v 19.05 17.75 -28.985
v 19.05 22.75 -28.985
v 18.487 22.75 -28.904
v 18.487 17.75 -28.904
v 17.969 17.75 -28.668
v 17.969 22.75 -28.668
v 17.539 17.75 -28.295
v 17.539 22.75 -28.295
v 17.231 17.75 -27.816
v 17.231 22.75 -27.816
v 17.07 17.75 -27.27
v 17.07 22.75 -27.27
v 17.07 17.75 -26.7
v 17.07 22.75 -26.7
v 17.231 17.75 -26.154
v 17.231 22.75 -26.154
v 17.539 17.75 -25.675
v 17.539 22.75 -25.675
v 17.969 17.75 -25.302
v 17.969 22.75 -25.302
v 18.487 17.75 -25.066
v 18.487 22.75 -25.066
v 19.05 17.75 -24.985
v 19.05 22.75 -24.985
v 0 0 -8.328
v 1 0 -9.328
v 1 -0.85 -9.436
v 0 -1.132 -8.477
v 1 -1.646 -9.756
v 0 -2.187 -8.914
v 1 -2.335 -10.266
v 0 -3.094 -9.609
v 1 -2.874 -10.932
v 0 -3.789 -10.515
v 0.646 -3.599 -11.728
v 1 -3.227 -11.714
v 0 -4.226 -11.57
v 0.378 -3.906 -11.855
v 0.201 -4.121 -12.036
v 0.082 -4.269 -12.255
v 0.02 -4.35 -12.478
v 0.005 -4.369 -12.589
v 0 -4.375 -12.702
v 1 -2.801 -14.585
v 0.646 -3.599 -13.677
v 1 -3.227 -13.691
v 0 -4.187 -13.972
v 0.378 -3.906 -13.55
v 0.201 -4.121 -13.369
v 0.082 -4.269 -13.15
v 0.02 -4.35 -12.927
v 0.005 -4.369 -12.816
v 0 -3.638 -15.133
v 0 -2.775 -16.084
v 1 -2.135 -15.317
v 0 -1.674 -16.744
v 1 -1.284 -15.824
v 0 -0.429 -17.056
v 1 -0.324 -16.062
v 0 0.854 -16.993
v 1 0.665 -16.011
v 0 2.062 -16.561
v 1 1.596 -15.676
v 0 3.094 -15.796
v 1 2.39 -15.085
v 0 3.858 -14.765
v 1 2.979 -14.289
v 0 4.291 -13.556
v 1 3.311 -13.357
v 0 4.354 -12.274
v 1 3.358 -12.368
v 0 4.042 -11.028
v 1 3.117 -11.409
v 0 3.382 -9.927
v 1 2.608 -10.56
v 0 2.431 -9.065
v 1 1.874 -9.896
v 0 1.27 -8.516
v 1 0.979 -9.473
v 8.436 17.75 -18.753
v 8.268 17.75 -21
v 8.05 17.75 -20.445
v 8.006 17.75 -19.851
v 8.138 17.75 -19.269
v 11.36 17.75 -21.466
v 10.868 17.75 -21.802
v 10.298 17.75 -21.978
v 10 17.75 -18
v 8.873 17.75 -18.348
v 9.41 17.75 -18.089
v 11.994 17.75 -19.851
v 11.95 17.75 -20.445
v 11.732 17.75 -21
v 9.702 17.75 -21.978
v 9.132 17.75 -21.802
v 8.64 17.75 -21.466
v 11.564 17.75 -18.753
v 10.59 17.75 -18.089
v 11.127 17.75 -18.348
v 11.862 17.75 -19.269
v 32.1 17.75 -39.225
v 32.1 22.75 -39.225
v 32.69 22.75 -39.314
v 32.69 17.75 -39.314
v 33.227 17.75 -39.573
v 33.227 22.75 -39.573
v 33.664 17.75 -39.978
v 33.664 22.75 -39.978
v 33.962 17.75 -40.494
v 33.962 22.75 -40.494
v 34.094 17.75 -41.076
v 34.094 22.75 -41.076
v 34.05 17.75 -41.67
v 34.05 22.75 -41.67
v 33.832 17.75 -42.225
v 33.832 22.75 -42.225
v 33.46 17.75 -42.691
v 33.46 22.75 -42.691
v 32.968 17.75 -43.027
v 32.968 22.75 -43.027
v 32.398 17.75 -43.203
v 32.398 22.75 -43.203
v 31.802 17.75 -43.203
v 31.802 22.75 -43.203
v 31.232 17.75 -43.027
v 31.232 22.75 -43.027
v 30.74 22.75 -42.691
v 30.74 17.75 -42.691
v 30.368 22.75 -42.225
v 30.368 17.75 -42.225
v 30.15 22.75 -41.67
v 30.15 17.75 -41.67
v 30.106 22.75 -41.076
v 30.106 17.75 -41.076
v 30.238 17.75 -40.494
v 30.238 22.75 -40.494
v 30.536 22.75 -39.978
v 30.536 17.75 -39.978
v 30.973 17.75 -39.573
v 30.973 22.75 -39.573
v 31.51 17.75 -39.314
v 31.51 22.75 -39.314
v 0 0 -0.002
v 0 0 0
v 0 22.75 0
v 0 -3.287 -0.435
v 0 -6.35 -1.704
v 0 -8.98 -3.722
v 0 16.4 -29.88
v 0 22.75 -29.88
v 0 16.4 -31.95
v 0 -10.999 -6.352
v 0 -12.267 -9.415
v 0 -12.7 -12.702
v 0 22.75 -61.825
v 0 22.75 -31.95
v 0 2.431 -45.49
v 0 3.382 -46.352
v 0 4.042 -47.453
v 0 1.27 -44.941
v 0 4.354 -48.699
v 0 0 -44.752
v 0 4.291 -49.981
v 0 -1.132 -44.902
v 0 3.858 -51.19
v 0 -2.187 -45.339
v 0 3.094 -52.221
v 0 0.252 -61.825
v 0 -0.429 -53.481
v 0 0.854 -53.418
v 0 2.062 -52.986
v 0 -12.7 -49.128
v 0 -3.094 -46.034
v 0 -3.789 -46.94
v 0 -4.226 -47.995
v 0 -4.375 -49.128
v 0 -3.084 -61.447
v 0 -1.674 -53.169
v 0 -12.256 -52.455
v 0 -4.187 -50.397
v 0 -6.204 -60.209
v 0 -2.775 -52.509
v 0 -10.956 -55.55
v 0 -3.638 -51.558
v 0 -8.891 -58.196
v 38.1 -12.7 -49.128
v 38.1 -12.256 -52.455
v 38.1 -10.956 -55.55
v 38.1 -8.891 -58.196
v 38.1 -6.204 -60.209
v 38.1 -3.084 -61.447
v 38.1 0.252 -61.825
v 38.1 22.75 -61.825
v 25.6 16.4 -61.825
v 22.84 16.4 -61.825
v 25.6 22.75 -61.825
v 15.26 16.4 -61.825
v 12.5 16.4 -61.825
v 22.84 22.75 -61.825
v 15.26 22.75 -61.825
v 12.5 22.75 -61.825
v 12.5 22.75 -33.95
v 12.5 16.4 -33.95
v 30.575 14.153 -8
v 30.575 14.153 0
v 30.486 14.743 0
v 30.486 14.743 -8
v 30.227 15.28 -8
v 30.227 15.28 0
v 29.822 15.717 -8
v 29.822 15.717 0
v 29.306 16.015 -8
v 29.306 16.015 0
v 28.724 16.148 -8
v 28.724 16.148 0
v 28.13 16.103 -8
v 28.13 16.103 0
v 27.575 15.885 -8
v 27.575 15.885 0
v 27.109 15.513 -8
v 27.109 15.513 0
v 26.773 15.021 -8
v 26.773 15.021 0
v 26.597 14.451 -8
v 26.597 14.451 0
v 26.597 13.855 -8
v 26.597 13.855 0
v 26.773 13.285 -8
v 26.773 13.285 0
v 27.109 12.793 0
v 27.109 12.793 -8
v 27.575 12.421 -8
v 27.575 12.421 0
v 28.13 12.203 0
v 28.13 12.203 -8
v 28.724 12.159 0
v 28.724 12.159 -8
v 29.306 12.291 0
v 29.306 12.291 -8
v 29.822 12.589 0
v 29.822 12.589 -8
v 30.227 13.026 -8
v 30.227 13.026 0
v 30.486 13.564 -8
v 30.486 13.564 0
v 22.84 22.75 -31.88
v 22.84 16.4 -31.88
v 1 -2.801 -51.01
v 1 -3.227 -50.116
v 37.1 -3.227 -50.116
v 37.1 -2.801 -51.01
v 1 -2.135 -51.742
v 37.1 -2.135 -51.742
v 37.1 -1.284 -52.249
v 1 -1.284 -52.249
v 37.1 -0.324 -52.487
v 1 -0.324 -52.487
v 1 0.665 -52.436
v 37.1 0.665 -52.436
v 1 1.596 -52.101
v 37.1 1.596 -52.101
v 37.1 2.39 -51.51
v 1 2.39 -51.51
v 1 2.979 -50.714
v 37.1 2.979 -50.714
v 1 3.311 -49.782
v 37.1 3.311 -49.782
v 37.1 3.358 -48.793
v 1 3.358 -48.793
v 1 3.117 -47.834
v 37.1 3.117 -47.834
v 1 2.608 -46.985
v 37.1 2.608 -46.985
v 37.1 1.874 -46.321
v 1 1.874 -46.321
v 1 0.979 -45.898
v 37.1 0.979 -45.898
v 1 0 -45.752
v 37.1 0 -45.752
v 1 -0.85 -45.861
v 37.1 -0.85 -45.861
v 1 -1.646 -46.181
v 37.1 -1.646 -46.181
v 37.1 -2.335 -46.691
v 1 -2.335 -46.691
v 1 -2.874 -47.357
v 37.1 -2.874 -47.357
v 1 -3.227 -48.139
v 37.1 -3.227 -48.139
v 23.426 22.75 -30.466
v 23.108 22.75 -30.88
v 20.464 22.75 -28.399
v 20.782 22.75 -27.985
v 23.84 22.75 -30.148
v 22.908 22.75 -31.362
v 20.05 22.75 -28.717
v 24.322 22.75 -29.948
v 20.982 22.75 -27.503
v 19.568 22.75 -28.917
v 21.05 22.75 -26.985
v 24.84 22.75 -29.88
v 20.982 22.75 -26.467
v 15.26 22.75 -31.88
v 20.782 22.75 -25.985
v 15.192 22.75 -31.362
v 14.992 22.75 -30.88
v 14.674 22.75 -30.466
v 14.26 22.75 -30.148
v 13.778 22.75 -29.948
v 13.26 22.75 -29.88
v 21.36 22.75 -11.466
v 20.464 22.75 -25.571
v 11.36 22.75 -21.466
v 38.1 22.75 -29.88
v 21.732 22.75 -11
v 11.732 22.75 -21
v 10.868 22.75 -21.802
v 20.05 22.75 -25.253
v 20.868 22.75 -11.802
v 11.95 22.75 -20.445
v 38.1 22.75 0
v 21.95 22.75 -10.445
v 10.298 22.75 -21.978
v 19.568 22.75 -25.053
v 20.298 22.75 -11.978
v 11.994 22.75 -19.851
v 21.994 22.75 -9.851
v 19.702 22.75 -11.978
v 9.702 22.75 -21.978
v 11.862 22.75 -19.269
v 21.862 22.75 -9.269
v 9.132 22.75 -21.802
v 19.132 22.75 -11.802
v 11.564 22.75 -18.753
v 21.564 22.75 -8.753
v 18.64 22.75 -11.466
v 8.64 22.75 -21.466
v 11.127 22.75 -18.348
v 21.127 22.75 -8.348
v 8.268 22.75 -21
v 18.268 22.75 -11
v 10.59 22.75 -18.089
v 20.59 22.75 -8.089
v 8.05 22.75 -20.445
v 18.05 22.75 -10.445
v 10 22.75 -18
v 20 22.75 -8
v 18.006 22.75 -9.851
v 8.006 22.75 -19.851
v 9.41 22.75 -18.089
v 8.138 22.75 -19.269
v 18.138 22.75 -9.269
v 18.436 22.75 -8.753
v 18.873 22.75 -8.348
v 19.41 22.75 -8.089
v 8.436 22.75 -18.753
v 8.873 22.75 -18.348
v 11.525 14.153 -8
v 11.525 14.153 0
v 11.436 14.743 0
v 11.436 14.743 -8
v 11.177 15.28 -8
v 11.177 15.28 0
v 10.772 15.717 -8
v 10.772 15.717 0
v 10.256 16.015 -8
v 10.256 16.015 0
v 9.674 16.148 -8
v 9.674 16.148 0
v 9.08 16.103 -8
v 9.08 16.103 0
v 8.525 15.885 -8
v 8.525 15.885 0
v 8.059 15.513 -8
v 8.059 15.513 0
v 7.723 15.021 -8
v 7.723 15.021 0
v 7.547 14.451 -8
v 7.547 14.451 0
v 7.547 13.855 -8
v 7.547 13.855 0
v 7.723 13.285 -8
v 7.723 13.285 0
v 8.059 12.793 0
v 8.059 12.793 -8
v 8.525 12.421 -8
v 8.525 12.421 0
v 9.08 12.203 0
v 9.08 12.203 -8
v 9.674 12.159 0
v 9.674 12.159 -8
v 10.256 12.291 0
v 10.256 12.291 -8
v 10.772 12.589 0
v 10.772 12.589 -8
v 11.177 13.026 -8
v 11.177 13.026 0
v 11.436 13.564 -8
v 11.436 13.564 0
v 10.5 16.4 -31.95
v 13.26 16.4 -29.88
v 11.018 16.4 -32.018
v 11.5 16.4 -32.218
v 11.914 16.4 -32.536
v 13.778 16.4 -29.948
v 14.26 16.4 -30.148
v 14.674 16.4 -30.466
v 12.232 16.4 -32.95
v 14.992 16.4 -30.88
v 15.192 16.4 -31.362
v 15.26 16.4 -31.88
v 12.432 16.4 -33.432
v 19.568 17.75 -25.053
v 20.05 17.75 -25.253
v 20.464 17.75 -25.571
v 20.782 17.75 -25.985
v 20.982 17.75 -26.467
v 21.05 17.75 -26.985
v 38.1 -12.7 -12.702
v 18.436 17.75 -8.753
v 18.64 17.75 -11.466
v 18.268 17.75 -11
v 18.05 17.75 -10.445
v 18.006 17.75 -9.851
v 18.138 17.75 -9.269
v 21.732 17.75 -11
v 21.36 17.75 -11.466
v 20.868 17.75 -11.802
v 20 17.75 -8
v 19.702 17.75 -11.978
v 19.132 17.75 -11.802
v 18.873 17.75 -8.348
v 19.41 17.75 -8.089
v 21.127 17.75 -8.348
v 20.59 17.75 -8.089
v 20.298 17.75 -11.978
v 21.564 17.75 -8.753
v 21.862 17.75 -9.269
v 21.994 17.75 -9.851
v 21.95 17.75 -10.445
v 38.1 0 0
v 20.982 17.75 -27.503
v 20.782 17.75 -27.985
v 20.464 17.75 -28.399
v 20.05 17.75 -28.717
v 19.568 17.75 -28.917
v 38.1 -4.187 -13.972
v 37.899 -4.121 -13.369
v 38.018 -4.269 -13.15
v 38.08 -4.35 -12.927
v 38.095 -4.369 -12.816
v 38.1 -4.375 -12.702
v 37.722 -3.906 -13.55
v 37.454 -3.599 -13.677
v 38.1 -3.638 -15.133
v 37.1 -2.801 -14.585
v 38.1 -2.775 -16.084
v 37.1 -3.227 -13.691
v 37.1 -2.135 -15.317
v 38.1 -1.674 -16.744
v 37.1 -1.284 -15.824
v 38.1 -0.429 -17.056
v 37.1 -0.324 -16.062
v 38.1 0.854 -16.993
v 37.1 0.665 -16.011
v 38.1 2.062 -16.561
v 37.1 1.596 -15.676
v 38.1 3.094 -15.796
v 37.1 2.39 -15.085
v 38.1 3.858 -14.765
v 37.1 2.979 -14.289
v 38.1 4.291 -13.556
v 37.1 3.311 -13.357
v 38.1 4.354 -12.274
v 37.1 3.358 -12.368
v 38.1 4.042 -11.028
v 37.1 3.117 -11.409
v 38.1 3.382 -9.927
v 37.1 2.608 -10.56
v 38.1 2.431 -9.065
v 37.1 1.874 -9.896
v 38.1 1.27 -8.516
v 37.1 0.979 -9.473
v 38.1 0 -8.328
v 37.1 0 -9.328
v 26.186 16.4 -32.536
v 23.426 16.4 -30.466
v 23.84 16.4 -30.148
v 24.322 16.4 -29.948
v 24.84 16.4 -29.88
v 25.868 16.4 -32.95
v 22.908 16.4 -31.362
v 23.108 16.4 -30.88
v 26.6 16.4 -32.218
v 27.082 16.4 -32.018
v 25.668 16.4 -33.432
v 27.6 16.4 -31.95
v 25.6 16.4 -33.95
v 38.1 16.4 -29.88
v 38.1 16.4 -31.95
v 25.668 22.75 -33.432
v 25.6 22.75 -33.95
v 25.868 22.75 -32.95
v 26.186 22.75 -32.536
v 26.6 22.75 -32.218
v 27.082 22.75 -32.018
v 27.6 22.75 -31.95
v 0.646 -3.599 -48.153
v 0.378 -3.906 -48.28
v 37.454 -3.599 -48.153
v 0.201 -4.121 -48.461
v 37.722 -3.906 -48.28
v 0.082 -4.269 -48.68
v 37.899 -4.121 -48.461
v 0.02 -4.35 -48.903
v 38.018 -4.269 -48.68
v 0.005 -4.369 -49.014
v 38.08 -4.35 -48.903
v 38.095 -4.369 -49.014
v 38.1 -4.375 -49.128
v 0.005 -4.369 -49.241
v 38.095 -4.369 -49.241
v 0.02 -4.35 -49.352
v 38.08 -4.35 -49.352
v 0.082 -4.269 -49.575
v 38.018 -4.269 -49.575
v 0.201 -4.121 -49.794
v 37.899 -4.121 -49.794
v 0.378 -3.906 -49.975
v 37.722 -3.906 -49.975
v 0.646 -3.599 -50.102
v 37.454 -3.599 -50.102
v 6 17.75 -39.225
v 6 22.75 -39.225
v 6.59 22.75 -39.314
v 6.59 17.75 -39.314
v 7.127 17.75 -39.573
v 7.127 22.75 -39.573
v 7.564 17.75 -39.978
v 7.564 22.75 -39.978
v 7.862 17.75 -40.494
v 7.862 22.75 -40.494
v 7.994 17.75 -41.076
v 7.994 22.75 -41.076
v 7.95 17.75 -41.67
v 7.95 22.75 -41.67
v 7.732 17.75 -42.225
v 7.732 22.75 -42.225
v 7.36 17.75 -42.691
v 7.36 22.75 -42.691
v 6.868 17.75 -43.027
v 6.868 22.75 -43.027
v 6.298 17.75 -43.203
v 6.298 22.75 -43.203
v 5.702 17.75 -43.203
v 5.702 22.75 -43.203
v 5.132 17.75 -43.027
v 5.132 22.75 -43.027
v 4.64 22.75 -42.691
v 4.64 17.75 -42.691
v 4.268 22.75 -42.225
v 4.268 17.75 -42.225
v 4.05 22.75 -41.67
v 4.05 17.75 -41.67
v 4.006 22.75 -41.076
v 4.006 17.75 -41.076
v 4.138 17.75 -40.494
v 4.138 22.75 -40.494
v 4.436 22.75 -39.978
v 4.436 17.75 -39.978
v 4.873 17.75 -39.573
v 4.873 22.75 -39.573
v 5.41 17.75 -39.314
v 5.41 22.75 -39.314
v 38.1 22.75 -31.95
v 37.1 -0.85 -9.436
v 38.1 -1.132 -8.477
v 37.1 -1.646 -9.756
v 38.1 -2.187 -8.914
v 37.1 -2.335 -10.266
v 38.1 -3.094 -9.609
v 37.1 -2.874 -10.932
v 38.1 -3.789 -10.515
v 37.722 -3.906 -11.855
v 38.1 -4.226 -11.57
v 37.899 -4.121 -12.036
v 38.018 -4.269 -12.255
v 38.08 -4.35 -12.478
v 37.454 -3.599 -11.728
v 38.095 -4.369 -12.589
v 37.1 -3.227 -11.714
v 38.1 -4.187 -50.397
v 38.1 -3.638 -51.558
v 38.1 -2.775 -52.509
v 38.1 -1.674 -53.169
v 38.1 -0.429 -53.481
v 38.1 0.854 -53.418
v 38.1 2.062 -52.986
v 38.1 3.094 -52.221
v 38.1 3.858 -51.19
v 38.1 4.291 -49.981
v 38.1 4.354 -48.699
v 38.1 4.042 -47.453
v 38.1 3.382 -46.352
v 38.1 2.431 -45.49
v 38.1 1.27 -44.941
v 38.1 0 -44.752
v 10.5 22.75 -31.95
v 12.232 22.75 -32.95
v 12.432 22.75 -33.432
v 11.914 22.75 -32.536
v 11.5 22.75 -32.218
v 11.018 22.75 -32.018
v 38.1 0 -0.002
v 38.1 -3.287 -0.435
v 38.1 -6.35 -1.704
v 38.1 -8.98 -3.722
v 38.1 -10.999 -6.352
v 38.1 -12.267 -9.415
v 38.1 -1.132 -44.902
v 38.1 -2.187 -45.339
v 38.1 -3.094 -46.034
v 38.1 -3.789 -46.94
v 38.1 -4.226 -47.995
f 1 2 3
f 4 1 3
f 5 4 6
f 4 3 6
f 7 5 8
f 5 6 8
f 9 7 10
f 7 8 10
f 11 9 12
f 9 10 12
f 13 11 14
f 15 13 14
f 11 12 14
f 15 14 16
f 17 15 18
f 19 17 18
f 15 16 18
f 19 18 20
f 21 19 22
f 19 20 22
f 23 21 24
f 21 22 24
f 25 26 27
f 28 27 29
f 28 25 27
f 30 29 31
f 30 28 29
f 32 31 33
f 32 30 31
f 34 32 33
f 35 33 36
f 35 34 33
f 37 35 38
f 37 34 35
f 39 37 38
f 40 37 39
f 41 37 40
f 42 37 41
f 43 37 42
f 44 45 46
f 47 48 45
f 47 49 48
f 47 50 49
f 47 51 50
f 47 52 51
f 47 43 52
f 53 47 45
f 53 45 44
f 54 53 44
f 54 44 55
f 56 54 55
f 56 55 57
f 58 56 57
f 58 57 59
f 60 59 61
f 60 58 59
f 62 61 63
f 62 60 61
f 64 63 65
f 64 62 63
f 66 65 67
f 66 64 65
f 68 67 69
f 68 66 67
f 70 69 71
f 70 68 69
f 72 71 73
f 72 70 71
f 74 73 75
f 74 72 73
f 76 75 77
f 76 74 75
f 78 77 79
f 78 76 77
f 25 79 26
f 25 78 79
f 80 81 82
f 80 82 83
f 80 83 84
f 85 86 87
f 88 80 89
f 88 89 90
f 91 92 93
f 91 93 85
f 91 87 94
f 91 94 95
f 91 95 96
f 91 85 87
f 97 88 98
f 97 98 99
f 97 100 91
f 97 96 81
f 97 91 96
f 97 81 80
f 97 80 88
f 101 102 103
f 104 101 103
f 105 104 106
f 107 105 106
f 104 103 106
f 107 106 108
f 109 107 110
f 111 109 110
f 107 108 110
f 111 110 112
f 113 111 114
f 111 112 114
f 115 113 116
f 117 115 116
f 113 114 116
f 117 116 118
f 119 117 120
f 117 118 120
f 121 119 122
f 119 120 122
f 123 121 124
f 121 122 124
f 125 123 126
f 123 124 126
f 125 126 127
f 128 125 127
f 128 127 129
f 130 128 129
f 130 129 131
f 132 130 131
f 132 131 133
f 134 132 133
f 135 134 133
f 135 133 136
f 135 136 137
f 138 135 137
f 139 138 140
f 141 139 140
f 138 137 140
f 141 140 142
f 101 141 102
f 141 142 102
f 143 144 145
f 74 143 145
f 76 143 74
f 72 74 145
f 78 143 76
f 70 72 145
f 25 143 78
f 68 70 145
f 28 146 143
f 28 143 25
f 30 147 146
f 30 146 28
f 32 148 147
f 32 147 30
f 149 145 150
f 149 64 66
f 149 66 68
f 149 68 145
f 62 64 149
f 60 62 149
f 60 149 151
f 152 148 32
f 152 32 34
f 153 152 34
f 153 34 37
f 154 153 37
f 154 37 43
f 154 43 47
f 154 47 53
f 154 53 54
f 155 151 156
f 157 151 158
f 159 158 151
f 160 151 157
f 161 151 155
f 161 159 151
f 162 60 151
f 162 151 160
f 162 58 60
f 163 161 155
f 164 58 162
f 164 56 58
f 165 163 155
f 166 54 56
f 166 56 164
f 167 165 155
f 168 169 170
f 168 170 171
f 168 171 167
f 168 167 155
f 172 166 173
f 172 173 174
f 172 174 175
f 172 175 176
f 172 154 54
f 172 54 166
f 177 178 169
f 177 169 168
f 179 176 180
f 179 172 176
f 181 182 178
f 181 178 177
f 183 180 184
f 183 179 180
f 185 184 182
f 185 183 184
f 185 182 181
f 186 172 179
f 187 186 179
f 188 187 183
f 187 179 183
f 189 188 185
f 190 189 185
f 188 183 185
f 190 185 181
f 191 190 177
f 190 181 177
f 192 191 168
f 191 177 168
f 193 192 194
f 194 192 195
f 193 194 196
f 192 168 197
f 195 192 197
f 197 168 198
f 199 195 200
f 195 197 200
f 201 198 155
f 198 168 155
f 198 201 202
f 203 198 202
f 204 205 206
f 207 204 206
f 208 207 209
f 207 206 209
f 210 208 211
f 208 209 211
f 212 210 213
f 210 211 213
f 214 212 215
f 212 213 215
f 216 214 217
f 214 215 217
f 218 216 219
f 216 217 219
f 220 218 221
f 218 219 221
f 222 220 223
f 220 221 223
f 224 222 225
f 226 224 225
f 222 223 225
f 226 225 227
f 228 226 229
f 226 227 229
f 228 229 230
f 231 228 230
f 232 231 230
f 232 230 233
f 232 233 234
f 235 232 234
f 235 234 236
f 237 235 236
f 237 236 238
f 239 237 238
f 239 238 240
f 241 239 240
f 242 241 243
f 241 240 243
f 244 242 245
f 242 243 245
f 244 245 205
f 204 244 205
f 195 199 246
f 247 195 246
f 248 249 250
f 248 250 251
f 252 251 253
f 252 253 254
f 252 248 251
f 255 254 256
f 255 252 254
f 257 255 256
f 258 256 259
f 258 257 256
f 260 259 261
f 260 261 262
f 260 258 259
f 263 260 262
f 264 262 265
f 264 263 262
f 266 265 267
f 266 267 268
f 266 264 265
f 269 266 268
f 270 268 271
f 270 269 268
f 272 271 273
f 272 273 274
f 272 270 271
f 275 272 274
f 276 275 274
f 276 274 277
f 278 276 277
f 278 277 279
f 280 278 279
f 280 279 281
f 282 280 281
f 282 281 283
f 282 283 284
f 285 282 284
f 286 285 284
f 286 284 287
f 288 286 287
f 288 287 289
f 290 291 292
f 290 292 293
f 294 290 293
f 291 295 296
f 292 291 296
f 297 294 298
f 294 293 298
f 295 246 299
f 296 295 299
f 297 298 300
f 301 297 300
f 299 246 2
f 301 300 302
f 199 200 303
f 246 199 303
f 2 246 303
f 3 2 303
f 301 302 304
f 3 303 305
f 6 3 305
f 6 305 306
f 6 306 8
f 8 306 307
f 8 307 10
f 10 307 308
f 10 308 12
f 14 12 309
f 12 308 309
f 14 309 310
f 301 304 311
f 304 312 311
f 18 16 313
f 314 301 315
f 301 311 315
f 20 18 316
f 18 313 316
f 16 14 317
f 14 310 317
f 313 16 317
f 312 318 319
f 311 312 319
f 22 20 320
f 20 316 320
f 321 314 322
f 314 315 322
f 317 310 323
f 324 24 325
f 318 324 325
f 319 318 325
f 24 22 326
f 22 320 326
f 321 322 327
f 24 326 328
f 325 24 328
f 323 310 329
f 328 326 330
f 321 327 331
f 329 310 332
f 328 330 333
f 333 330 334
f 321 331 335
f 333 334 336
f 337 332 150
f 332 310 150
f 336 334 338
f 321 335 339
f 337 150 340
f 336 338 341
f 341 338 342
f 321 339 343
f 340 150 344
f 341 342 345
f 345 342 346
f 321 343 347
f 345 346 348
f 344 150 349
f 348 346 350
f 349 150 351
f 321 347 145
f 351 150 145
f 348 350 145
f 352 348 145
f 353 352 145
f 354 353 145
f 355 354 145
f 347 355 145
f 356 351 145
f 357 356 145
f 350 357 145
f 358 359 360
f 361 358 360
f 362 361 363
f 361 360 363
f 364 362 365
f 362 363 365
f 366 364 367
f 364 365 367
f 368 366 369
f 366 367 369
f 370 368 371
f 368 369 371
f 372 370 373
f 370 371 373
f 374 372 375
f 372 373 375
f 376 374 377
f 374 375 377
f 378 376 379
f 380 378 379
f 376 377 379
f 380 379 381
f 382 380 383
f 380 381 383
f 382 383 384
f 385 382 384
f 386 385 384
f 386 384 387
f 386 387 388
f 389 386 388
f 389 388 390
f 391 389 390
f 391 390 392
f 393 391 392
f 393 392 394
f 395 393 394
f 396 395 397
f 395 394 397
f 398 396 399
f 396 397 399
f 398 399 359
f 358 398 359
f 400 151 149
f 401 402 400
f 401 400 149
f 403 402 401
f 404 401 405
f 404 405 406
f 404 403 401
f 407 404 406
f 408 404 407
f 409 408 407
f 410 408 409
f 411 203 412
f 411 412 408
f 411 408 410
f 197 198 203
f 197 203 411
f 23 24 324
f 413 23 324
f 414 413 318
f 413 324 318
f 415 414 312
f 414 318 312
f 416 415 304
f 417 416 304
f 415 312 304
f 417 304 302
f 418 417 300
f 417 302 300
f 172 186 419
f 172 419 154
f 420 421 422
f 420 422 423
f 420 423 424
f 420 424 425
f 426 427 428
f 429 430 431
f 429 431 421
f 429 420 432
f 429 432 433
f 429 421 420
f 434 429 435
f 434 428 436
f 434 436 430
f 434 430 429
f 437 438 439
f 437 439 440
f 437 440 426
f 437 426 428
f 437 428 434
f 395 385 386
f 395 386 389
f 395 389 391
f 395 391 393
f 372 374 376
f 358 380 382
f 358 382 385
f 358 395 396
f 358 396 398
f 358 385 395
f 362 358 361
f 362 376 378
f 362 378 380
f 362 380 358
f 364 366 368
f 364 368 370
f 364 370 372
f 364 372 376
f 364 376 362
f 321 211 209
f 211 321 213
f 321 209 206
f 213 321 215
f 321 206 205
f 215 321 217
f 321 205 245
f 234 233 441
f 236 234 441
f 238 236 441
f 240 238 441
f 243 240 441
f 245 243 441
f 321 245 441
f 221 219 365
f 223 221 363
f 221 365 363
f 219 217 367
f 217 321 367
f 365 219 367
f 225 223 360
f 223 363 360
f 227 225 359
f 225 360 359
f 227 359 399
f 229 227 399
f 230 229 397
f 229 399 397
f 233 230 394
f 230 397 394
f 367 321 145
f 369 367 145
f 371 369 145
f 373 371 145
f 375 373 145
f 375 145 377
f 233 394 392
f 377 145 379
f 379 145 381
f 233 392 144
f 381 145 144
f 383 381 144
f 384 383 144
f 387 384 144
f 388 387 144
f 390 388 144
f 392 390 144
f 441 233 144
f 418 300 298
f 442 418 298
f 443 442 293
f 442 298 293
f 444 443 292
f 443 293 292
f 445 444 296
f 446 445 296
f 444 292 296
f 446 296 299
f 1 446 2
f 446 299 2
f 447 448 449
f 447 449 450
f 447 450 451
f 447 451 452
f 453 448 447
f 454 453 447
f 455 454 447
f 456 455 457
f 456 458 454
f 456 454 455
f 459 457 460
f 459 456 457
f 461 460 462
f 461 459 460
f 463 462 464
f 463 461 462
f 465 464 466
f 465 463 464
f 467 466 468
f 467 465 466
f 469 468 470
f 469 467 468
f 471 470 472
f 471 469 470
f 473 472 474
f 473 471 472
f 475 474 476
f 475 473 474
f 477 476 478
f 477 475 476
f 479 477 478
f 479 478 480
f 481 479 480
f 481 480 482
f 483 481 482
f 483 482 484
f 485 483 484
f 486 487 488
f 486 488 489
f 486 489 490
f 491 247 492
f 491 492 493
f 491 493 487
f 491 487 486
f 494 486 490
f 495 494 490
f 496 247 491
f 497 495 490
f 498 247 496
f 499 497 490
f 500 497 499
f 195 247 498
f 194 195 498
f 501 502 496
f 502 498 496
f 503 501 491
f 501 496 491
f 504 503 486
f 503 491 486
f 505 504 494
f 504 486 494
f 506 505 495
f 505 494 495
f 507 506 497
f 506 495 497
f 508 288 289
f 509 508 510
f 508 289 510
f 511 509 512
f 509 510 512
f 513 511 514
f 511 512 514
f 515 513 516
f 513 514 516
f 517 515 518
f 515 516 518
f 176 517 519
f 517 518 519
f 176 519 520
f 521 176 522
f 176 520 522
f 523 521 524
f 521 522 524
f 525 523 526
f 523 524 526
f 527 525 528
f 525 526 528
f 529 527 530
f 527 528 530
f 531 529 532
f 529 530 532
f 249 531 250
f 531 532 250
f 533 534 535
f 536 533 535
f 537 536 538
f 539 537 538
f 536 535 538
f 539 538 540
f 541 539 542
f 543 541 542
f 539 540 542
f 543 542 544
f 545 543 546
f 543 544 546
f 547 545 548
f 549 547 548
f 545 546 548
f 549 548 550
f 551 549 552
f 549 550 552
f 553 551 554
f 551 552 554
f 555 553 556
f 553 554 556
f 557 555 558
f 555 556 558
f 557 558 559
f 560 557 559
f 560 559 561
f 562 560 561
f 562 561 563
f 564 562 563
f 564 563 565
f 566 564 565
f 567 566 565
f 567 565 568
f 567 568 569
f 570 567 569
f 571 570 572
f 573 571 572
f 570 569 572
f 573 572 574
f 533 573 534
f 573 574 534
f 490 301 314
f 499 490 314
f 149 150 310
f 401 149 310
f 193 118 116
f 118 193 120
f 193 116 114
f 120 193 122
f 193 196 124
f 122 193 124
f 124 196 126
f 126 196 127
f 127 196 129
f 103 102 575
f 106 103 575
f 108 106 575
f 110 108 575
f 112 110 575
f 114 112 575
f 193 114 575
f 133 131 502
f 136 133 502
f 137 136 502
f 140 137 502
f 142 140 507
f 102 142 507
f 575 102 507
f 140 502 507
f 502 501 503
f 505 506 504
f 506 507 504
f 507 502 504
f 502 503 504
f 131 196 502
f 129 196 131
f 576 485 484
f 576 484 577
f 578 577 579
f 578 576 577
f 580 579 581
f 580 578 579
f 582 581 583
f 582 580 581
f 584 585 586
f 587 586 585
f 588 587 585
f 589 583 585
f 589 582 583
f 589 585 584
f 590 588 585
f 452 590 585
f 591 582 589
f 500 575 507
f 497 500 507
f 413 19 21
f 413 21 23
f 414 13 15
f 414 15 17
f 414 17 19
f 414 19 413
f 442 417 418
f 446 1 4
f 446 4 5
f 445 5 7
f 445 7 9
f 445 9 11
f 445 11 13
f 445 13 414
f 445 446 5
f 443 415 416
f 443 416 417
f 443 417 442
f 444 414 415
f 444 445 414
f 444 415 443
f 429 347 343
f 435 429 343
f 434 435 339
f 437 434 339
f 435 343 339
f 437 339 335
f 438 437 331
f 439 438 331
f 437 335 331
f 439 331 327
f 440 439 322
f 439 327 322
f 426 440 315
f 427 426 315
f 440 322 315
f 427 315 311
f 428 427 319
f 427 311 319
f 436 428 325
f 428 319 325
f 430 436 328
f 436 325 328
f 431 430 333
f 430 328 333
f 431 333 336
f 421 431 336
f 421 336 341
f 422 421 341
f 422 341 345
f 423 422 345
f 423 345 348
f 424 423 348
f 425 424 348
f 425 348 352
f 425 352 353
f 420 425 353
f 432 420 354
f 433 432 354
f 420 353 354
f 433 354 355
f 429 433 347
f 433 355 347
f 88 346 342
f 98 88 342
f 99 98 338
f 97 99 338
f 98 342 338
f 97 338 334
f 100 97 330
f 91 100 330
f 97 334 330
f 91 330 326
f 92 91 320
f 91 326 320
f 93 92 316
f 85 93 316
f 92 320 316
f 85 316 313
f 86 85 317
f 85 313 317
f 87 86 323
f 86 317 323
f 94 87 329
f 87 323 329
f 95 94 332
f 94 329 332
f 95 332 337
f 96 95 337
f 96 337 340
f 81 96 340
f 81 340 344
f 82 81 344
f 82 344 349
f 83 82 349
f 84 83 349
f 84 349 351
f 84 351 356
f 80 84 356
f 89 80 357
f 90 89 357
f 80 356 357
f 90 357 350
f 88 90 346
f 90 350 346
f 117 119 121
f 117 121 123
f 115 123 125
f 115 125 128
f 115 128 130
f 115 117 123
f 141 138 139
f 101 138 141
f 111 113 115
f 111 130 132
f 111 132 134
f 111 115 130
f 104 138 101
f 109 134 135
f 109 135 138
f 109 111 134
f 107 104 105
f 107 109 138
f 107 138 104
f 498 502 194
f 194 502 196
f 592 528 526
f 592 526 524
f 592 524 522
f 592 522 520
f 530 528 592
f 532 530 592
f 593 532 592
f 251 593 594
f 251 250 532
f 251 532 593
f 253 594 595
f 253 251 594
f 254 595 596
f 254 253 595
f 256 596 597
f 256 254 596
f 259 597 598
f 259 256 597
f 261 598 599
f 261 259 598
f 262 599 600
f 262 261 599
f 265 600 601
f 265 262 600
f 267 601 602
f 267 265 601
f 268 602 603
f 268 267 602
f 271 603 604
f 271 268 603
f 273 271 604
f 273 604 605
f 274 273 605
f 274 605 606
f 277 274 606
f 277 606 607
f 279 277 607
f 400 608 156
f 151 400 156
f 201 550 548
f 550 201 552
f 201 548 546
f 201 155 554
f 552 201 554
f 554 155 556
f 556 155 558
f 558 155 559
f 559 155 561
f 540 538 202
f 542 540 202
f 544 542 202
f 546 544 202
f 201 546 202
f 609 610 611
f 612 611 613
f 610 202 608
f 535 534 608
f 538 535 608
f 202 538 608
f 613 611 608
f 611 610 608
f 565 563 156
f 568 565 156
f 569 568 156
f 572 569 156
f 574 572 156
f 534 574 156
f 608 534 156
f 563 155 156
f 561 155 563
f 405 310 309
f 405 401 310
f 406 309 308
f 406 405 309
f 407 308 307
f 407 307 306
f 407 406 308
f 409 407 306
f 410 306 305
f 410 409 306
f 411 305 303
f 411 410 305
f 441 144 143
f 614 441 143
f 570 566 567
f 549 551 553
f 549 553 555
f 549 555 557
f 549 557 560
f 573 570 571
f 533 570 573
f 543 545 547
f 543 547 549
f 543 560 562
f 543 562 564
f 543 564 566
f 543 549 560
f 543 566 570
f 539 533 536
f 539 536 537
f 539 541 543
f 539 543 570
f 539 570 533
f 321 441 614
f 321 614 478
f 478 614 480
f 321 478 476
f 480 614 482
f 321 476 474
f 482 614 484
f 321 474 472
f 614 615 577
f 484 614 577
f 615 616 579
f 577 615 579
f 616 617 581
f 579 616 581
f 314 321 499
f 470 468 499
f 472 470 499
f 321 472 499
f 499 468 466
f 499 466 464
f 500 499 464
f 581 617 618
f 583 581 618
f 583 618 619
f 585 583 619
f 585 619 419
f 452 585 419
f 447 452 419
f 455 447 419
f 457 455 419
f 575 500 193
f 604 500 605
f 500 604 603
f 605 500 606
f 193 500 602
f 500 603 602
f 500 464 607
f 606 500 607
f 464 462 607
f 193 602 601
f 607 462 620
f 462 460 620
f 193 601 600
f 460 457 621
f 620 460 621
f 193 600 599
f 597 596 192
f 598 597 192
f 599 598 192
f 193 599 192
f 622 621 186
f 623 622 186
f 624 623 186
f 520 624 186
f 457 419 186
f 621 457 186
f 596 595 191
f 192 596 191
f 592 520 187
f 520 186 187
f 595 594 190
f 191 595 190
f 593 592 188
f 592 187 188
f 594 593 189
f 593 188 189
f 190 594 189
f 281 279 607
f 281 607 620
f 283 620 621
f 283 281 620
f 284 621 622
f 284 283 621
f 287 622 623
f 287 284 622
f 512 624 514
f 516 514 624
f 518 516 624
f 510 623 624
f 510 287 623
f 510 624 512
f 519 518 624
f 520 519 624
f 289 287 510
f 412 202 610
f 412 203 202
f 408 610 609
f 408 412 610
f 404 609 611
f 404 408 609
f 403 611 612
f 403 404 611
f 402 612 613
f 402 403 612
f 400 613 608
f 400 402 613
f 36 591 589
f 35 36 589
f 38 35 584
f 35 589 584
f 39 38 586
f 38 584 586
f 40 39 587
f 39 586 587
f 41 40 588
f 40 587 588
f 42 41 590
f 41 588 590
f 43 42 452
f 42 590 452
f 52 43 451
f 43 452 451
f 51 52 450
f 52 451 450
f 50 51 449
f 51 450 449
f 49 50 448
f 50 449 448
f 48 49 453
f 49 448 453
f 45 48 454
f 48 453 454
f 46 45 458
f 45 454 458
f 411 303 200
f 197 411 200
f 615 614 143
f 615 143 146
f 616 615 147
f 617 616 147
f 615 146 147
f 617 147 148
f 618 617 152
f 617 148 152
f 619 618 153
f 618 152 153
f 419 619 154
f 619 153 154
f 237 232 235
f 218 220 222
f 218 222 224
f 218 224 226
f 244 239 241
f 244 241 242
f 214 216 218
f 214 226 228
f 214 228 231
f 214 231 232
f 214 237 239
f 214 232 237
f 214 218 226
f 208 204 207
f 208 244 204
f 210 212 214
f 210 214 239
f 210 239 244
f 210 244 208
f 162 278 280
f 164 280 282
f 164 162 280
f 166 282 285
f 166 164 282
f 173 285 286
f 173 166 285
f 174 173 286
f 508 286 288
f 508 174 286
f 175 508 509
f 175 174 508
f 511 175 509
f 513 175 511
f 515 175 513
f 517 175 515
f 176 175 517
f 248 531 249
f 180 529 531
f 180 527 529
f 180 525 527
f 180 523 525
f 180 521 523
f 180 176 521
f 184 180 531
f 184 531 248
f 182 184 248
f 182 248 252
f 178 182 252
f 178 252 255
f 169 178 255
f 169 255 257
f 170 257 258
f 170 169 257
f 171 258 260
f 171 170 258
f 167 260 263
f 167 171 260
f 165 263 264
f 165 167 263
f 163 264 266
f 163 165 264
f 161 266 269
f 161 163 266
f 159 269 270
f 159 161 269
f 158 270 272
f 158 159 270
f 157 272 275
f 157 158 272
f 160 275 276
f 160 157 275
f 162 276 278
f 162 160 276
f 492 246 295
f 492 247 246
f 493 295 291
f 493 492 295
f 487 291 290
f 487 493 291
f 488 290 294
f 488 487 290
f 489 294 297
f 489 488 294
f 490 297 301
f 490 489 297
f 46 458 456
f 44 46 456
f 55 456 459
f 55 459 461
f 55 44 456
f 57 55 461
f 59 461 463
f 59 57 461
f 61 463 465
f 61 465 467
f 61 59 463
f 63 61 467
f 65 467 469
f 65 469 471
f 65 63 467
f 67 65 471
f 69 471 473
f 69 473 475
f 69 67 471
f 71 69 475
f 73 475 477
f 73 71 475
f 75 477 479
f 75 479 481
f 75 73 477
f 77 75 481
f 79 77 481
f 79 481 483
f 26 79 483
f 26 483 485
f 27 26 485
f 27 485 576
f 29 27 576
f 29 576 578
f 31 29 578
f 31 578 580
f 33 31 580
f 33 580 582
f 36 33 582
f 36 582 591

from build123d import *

# Parameters (mm, degrees)
SKETCH1_R           = 3.375
BOSS_EXTRUDE2_DEPTH = 38.1
BOSS_EXTRUDE3_REACH = 82.814
SKETCH6_W           = 38.1
SKETCH6_H           = 36.425
SKETCH10_R          = 2
CUT_EXTRUDE6_DEPTH  = 8
CHAMFER1_SIZE       = 1
CUT_EXTRUDE11_DEPTH = 6.35
SKETCH16_R          = 2
CUT_EXTRUDE10_DEPTH = 5
SKETCH17_R          = 1
CUT_EXTRUDE12_DEPTH = 77.103956903
FILLET1_R           = 2


with BuildPart() as part:
    # Sketch1 → Boss-Extrude2 (new body)
    with BuildSketch(Plane(origin=(0, 0, 0), x_dir=(0, 0, -1), z_dir=(1, 0, 0))):
        with BuildLine():
            Line((61.825, 22.75), (0, 22.75))
            Line((0, 22.75), (0, 0))
            Line((0, 0), (0.0025, 0))
            ThreePointArc((0.0025, 0), (12.7025, -12.7), (25.4025, 0))
            Line((25.4025, 0), (36.4275, 0))
            ThreePointArc((36.4275, 0), (49.253496032, -12.699374985), (61.825, 0.251979662))
            Line((61.825, 0.251979662), (61.825, 22.75))
        make_face()
        with Locations(Location((49.1275, 0, 0), (0, 0, 180))):
            Circle(SKETCH1_R, mode=Mode.SUBTRACT)
        with Locations(Location((12.7025, 0, 0), (0, 0, 180))):
            Circle(SKETCH1_R, mode=Mode.SUBTRACT)
    extrude(amount=BOSS_EXTRUDE2_DEPTH)

    # Sketch6 → Boss-Extrude3 (add, up to next)
    with BuildSketch(Plane(origin=(0, -12.7, 0), x_dir=(-1, 0, 0), z_dir=(0, -1, 0)), mode=Mode.PRIVATE) as boss_extrude3_sk1:
        with Locations((-19.05, 30.915)):
            Rectangle(SKETCH6_W, SKETCH6_H)
    boss_extrude3_tool1 = extrude(boss_extrude3_sk1.sketch, amount=-BOSS_EXTRUDE3_REACH, mode=Mode.PRIVATE) - part.part
    add(boss_extrude3_tool1.solids().sort_by_distance((19.05, -12.7, -30.915))[0])

    # Sketch10 → Cut-Extrude6 (cut)
    with BuildSketch(Plane.XY):
        with Locations((9.525, 14.153125)):
            Circle(SKETCH10_R)
        with Locations((28.575, 14.153125)):
            Circle(SKETCH10_R)
    extrude(amount=-CUT_EXTRUDE6_DEPTH, mode=Mode.SUBTRACT)

    # Chamfer1
    chamfer1_edges = [part.edges().sort_by_distance(p)[0] for p in [
        (0, 0, -16.0775),
        (0, 0, -52.5025),
        (38.1, 0, -16.0775),
        (38.1, 0, -52.5025),
    ]]
    chamfer(chamfer1_edges, length=CHAMFER1_SIZE)

    # Sketch15 → Cut-Extrude11 (cut)
    with BuildSketch(Plane(origin=(0, 22.75, 0), x_dir=(1, 0, 0), z_dir=(0, 1, 0))):
        Polygon((12.5, 31.95), (0, 31.95), (0, 29.88), (15.26, 29.88), (15.26, 61.825), (12.5, 61.825), align=None)
        Polygon((25.6, 61.825), (22.84, 61.825), (22.84, 29.88), (38.1, 29.88), (38.1, 31.95), (25.6, 31.95), align=None)
    extrude(amount=-CUT_EXTRUDE11_DEPTH, mode=Mode.SUBTRACT)

    # Sketch16 → Cut-Extrude10 (cut)
    with BuildSketch(Plane(origin=(0, 22.75, 0), x_dir=(1, 0, 0), z_dir=(0, 1, 0))):
        with Locations(Location((32.1, 41.225, 0), (0, 0, 270))):
            Circle(SKETCH16_R)
        with BuildLine():
            ThreePointArc((21.05, 26.985), (20.464213562, 28.399213562), (19.05, 28.985))
            Line((19.05, 28.985), (19.05, 24.985))
            ThreePointArc((19.05, 24.985), (20.464213562, 25.570786438), (21.05, 26.985))
        make_face()
        with BuildLine():
            Line((19.05, 24.985), (19.05, 28.985))
            ThreePointArc((19.05, 28.985), (17.05, 26.985), (19.05, 24.985))
        make_face()
        with Locations(Location((6, 41.225, 0), (0, 0, 270))):
            Circle(SKETCH16_R)
        with Locations(Location((10, 20, 0), (0, 0, 270))):
            Circle(SKETCH16_R)
        with Locations(Location((20, 10, 0), (0, 0, 270))):
            Circle(SKETCH16_R)
    extrude(amount=-CUT_EXTRUDE10_DEPTH, mode=Mode.SUBTRACT)

    # Sketch17 → Cut-Extrude12 (cut, through all)
    with BuildSketch(Plane(origin=(38.1, 0, 0), x_dir=(0, 0, -1), z_dir=(1, 0, 0))):
        with Locations((12.7025, -3.375)):
            Circle(SKETCH17_R)
        with Locations((49.1275, -3.375)):
            Circle(SKETCH17_R)
    extrude(amount=-CUT_EXTRUDE12_DEPTH, mode=Mode.SUBTRACT)

    # Fillet1
    fillet1_edges = [part.edges().sort_by_distance(p)[0] for p in [
        (15.26, 19.575, -29.88),
        (12.5, 19.575, -31.95),
        (22.84, 19.575, -29.88),
        (25.6, 19.575, -31.95),
    ]]
    fillet(fillet1_edges, radius=FILLET1_R)


solid = part.part
